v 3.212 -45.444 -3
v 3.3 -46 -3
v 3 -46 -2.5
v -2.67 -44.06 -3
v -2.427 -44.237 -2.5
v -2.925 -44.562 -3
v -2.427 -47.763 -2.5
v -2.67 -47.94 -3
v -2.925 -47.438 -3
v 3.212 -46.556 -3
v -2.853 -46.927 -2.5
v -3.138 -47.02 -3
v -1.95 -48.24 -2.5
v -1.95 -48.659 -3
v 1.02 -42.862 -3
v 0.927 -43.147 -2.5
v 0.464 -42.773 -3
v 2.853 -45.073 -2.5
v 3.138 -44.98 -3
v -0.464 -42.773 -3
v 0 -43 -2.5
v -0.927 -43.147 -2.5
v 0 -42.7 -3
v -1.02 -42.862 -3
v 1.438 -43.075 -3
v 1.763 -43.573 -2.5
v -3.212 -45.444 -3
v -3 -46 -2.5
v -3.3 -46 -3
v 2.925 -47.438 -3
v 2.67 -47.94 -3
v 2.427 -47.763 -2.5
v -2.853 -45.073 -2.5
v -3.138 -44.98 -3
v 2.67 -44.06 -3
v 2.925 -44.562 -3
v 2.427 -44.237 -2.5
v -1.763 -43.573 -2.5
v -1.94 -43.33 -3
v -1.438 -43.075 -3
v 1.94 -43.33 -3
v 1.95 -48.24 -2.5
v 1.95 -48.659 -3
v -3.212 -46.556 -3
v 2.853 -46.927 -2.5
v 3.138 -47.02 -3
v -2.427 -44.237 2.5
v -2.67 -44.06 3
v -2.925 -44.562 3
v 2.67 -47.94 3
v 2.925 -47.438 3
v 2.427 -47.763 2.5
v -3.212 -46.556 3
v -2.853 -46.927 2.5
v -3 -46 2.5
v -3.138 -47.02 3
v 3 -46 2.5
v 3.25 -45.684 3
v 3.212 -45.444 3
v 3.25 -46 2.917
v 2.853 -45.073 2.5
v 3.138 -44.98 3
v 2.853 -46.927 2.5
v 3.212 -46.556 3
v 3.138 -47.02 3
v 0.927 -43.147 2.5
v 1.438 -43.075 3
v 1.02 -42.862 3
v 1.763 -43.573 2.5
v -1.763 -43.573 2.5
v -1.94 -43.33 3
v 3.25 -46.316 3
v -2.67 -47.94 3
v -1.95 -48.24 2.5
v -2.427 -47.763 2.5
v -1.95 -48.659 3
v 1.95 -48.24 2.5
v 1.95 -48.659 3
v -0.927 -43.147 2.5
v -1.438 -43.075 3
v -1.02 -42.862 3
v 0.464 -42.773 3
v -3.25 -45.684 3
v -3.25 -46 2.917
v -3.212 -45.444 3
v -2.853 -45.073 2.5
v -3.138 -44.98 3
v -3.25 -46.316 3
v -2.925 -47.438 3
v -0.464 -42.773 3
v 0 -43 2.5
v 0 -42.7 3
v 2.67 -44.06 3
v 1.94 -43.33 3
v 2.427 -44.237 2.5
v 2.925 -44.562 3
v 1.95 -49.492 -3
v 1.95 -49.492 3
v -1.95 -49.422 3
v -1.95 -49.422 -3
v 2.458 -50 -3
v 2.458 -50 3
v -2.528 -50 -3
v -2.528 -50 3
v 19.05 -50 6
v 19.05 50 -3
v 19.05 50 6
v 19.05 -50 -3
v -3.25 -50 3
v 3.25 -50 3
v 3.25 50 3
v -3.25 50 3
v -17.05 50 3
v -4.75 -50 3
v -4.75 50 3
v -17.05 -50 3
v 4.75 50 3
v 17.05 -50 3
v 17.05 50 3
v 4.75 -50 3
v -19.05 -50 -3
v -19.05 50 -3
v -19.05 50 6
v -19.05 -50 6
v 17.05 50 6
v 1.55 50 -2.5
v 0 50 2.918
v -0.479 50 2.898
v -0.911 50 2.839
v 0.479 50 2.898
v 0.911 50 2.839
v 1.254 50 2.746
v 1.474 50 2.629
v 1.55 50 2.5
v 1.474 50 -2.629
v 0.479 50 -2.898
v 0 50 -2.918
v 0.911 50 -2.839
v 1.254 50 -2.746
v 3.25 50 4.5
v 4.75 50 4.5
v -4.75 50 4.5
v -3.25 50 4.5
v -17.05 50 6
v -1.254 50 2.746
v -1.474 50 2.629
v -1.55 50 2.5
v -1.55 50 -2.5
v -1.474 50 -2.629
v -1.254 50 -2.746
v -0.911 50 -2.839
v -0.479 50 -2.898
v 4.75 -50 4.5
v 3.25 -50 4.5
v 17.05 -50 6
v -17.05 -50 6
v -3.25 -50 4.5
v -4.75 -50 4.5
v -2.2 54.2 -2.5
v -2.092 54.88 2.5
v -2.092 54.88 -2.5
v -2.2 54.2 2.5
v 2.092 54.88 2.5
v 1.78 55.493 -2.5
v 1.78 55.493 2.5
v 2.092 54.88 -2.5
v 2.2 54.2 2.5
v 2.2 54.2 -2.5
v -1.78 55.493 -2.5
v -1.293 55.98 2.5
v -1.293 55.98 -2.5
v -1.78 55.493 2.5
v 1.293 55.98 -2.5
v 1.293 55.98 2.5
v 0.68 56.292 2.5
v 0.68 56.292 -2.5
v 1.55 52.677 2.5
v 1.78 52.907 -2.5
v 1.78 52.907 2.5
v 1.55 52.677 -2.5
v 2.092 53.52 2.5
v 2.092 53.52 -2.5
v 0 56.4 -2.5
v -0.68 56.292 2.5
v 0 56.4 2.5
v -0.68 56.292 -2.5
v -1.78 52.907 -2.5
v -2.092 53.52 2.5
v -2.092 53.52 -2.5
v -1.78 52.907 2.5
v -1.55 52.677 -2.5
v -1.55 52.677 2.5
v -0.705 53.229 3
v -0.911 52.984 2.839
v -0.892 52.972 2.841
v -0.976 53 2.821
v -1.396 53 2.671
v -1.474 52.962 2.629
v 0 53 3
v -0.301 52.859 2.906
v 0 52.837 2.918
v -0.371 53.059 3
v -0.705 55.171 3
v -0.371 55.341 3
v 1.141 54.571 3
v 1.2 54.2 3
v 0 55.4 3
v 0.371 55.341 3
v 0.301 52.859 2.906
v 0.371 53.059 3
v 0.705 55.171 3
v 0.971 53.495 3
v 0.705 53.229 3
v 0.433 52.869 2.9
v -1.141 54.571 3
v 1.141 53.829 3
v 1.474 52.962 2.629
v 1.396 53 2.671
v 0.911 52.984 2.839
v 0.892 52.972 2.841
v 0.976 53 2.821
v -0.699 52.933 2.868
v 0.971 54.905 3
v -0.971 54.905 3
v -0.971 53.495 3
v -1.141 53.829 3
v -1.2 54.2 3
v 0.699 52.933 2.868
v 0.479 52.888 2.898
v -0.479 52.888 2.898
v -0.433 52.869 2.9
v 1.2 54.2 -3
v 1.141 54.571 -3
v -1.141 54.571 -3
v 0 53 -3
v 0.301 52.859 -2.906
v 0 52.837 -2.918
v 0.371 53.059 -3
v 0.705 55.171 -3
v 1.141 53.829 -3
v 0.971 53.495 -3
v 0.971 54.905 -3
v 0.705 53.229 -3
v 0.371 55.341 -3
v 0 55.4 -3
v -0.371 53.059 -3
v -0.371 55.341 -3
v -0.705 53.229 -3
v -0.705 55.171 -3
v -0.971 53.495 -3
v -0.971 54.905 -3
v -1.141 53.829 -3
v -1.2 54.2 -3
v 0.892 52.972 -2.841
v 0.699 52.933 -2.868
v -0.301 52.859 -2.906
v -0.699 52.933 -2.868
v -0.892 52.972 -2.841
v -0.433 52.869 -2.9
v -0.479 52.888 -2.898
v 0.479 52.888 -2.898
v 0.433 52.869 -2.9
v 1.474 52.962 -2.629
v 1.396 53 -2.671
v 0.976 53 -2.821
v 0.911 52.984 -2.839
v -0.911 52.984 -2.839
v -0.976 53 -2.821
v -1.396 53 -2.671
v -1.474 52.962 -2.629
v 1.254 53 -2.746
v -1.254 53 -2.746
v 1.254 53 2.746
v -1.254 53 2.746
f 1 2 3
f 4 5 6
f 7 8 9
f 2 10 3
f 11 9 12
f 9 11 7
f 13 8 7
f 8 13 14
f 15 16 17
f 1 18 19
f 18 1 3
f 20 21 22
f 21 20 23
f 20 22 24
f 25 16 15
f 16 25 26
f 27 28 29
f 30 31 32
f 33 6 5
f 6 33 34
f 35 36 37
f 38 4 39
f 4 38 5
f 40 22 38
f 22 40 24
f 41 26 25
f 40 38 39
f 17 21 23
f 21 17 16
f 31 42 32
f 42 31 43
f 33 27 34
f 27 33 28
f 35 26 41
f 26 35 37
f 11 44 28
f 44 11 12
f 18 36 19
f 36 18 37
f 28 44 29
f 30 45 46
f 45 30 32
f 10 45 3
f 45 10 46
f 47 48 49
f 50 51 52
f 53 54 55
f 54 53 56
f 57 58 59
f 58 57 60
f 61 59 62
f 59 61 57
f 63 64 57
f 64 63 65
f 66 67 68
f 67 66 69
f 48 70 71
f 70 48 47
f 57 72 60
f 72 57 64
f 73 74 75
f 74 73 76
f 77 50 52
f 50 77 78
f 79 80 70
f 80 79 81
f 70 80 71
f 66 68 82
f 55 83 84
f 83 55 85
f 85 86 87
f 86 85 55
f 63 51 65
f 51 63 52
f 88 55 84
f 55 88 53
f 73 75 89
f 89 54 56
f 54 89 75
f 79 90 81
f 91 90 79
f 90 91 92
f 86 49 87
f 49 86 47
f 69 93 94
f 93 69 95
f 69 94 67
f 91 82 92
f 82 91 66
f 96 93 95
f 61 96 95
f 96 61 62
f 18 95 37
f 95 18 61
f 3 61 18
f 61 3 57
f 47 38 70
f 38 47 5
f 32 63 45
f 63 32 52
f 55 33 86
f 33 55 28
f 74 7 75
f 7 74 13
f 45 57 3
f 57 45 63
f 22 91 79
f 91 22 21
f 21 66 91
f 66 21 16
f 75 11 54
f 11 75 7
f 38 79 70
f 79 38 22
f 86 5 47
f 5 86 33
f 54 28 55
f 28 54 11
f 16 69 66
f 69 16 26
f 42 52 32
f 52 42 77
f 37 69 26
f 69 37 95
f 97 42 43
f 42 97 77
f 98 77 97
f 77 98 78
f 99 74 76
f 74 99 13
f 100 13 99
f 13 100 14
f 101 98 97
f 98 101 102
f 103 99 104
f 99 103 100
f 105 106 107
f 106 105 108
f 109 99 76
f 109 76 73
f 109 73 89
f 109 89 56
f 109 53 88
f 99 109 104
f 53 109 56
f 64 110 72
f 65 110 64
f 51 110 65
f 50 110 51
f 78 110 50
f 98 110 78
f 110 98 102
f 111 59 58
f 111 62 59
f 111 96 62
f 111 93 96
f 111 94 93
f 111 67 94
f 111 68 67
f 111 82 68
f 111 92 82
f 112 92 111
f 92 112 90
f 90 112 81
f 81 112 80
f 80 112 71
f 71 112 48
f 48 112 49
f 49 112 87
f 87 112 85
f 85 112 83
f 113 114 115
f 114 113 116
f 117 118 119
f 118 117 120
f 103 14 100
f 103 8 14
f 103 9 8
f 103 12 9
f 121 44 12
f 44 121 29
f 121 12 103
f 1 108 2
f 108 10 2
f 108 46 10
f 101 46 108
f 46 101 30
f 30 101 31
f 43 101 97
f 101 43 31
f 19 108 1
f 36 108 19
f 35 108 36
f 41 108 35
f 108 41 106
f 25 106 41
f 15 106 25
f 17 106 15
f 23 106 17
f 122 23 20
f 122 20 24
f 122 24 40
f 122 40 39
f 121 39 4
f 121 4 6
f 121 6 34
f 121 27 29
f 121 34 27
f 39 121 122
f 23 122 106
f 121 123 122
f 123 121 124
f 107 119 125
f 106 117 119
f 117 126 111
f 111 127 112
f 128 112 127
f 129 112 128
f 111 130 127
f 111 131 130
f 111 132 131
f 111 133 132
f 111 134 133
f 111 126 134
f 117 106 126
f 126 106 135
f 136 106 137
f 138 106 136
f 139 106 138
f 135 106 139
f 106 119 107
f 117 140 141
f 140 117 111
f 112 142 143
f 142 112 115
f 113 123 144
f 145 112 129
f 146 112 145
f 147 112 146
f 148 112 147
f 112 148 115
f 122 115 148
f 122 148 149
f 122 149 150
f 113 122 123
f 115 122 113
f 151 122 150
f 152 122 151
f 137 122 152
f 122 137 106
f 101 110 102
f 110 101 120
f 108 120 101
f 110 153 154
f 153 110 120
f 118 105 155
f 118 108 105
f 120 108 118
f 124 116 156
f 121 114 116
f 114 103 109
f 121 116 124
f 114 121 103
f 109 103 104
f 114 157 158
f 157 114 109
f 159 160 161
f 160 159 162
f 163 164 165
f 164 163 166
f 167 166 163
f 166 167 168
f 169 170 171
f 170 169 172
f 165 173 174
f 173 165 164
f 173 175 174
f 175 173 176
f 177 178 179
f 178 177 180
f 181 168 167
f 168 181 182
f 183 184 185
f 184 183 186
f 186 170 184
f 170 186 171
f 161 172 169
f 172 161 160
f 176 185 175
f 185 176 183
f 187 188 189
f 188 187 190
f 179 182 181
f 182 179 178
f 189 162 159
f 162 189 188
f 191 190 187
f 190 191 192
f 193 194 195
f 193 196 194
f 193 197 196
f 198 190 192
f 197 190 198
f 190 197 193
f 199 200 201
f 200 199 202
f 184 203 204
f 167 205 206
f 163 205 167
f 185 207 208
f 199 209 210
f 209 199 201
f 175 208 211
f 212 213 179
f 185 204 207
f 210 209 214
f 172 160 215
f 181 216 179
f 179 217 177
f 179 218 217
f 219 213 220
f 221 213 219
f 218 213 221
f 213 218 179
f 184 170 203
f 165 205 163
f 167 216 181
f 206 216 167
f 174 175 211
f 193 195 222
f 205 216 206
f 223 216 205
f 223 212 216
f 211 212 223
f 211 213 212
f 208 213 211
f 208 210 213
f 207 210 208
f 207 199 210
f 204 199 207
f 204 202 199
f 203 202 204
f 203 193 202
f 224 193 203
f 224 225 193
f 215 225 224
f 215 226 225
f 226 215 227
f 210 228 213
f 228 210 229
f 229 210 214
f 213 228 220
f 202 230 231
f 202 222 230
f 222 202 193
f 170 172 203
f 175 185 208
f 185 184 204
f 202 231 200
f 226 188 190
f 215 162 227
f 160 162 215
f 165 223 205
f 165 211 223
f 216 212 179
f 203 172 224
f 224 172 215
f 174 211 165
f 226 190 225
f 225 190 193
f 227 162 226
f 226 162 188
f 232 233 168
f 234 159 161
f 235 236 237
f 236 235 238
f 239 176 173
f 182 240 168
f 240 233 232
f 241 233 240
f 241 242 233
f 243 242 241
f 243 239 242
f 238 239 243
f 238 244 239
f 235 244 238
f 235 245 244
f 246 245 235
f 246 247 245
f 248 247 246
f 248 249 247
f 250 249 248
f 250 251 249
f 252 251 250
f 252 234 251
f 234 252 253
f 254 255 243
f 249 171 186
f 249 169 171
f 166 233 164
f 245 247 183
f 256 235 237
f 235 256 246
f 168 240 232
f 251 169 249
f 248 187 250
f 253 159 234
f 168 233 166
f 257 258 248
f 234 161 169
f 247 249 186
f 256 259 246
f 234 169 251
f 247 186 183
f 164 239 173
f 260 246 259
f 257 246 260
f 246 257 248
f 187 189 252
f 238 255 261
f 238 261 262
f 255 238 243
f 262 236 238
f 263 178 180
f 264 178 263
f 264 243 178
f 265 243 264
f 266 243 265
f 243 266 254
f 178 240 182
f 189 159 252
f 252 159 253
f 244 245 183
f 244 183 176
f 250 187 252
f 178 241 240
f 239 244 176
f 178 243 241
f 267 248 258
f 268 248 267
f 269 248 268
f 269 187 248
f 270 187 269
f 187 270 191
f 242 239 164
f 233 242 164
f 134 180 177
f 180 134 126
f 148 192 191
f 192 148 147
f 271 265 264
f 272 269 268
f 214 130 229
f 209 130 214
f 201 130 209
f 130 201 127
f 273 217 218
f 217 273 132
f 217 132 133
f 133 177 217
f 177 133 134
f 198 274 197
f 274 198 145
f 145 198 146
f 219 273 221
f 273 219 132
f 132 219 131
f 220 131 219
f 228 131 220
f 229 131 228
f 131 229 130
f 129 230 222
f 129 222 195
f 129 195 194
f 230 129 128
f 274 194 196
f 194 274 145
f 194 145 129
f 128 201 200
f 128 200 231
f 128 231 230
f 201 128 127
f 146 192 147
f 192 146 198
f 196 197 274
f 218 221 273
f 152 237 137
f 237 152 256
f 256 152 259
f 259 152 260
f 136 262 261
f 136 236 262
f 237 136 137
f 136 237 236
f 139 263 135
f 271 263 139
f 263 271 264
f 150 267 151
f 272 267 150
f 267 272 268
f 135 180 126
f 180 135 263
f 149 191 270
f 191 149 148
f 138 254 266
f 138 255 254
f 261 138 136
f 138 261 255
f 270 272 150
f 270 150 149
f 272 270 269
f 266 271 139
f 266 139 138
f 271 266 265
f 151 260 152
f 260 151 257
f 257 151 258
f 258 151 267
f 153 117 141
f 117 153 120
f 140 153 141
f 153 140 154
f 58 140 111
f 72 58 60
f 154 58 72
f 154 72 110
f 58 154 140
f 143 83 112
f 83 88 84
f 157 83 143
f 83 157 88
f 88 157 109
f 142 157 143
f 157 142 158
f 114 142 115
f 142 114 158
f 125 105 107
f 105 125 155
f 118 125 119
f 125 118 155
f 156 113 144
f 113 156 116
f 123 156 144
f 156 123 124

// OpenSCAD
module center_rails(offset, rail_width, length, depth) {
    translate([offset,0,1]) {
        cube([rail_width, length, depth], center=true);
    }

    translate([-offset,0,1]) {
        cube([rail_width, length, depth], center=true);
    }
}

module side_rails(width_offset, height_offset, width, length, height) {
    translate([width_offset, 0, height_offset]) {
        cube([width, length, height], center=true);
    }

    translate([-width_offset, 0, height_offset]) {
        cube([width, length, height], center=true);
    }
}

module male_socket(l, d) {
    male_circle_connector_offset = 4.2;
    offset = (l / 2) + male_circle_connector_offset;
    male_cube_offset = l / 2 + 1;
    male_cube_width = 3.1;

    r = 2.2;

    translate([0, offset, 0]) {
        cylinder(r = r, h = d - 1, center=true);
    }
    translate([0, offset, (d - 0.5) / 2]) {
        cylinder(r1 = r, r2 = r-1, h = 0.5, center=true);
    }
    translate([0, offset, -(d - 0.5) / 2]) {
        cylinder(r2 = r, r1 = r-1, h = 0.5, center=true);
    }
    
    translate([0, male_cube_offset, 0]) {
        cube([male_cube_width, cube_length, d - 1], center=true);
    }
    translate([0, male_cube_offset + 2, (d - 1)/2]) {
        rotate(a=90, v=[1,0,0]) {
            scale([1, 0.27, 1]) {
                cylinder(d = male_cube_width, h = cube_length );
            }
        }
    }
    translate([0, male_cube_offset + 2, -(d - 1)/2]) {
        rotate(a=90, v=[1,0,0]) {
            scale([1, 0.27, 1]) {
                cylinder(d = male_cube_width, h = cube_length );
            }
        }
    }
}

module female_socket(l) {
    circle_connector_offset = 4;
    round_bevel_offset = 4;
    female_cube_width = 3.9;
    // this was 2.7 and it almost fit.
    r = 3;
    cylinder_offset = -((l / 2) - circle_connector_offset);
    female_cube_offset = -(l / 2) + 1.4;
    
    translate([0, cylinder_offset, -round_bevel_offset+1]) {
        cylinder(r1 = r * 1.2, r2 = r, h = 1, center=true);
    }
    translate([0, cylinder_offset, round_bevel_offset-1]) {
        cylinder(r2 = r * 1.2, r1 = r, h = 1, center=true);
    }
    translate([0, cylinder_offset, 0]) {
        cylinder(r = r, h = depth+ 0.15, center=true);
    }

    translate([0, female_cube_offset, 0]) {
        cube([female_cube_width, cube_length, depth+0.1], center=true);
    }
    translate([0, female_cube_offset - 1.7, 0]) {
        rotate(a=45, v=[0, 0, 1]) {
            cube([female_cube_width, cube_length, depth+0.1], center=true);
        }
    }
}



$fn = 20;
length = 100;
width = 38.1;
depth = 6;

center_rail_depth = depth + 1;
center_rail_width = 1.5;

center_rail_offset = 4;

side_rail_height = 8;
side_rail_width = 2;
side_rail_offset = (width - side_rail_width) / 2;
side_rail_height_offset = 2;

cube_length = 4;


difference() {
    cube([width, length, depth], center=true);
    female_socket(length);
}


male_socket(length, depth);
center_rails(center_rail_offset, center_rail_width, length, center_rail_depth);
side_rails(side_rail_offset, side_rail_height_offset, side_rail_width, length, side_rail_height);
